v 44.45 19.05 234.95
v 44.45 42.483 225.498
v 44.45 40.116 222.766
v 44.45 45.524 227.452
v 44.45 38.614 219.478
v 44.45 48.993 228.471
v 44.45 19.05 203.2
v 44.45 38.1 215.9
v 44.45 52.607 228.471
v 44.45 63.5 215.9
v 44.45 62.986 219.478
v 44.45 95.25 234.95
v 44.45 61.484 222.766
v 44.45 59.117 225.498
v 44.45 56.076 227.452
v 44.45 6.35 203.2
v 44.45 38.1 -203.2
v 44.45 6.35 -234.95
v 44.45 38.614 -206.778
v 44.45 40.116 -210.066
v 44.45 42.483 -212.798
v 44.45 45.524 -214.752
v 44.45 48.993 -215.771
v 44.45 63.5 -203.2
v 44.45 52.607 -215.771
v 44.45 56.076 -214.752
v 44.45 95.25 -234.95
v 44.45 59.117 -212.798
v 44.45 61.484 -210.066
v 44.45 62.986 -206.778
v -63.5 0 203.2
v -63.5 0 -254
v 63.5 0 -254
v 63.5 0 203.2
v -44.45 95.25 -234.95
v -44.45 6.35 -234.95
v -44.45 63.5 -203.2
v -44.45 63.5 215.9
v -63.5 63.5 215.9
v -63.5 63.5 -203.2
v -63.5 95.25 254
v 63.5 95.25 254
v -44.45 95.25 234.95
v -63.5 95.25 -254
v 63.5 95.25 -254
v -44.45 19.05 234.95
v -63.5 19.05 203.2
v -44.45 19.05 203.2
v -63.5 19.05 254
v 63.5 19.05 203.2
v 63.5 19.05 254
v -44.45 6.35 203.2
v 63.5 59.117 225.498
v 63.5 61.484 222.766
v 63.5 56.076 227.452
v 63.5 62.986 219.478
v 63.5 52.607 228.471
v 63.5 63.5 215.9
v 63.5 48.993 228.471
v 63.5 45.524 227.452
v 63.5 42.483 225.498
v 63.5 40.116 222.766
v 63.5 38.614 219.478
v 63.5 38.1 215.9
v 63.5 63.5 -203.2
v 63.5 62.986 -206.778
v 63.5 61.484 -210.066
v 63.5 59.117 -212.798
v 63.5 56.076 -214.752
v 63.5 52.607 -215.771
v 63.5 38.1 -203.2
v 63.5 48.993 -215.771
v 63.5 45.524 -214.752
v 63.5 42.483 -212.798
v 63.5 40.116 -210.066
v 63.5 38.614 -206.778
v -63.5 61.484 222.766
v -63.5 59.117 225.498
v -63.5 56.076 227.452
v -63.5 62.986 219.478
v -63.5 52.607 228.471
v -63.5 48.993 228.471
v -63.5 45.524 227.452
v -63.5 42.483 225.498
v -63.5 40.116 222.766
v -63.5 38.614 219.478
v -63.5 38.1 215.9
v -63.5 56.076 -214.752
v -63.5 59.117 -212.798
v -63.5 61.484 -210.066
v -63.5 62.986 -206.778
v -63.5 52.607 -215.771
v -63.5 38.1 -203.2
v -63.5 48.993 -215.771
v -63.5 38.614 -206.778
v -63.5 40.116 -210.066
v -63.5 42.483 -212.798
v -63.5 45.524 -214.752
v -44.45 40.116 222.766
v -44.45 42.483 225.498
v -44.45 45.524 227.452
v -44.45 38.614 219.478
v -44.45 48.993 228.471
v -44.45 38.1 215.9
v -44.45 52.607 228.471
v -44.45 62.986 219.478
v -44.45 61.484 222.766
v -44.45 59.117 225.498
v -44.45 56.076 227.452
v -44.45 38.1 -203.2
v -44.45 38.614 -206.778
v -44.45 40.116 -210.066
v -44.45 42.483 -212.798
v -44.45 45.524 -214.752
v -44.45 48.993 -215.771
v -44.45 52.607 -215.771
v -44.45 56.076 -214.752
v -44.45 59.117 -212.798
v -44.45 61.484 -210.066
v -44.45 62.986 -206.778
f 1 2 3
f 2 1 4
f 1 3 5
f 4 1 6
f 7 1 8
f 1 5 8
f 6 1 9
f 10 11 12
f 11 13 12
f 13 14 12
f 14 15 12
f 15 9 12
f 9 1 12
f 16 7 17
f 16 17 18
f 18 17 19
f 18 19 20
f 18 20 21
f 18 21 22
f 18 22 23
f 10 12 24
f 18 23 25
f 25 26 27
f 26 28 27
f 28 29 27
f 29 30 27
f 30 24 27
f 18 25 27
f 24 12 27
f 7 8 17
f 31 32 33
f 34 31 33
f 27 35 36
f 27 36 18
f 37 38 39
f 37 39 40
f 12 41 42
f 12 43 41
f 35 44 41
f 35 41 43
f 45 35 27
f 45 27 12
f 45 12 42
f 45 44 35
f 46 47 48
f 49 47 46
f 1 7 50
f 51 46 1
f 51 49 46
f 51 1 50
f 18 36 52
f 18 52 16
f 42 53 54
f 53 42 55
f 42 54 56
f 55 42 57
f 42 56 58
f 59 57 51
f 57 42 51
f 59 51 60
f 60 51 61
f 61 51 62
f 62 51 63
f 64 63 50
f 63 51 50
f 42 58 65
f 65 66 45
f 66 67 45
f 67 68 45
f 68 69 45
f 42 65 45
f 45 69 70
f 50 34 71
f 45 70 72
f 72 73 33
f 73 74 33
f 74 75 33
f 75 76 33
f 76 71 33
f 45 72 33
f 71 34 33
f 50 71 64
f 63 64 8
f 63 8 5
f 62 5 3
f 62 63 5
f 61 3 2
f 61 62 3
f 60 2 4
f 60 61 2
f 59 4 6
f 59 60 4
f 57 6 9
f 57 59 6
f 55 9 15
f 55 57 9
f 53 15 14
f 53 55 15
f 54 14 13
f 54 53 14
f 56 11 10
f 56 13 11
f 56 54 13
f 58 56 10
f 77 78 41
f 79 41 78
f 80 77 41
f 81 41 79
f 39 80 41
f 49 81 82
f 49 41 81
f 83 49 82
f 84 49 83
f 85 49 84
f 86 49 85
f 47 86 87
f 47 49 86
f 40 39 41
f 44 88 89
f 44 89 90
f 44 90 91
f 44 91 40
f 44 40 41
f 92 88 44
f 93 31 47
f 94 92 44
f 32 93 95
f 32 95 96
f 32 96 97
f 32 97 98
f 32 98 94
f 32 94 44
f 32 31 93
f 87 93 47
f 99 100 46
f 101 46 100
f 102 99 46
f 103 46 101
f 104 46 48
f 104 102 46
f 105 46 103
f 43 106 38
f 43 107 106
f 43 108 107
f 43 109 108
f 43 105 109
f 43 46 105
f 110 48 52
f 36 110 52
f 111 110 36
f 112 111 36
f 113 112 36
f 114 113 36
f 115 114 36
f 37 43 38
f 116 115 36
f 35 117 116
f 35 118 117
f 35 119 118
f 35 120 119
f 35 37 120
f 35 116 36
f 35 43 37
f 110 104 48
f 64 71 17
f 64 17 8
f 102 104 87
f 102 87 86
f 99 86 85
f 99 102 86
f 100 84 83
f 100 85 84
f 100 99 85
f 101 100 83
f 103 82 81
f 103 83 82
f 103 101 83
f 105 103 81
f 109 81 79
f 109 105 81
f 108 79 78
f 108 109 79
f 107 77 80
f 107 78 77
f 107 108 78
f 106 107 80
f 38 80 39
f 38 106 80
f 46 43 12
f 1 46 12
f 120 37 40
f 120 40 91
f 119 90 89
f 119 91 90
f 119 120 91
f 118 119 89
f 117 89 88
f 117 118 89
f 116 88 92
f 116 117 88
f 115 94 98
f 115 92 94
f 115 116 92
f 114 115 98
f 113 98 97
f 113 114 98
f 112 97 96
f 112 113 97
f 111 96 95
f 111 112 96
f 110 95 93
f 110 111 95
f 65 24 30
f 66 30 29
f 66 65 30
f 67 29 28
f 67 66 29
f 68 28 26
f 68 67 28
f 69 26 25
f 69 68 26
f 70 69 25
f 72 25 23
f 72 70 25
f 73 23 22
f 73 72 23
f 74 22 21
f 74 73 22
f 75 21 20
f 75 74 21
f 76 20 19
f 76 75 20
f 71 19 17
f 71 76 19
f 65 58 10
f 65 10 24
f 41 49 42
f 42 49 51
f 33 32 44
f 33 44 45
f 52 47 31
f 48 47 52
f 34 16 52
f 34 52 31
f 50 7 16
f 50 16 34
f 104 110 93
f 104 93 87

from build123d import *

# Parameters (mm, degrees)
SKETCH1_W           = 127
SKETCH1_H           = 508
BOSS_EXTRUDE1_DEPTH = 95.25
SKETCH2_W           = 88.9
SKETCH2_H           = 469.9
CUT_EXTRUDE2_DEPTH  = 88.9
CUT_EXTRUDE3_DEPTH  = 128
SKETCH4_W           = 127
SKETCH4_H           = 19.05
CUT_EXTRUDE4_DEPTH  = 50.8


with BuildPart() as part:
    # Sketch1 → Boss-Extrude1 (new body)
    with BuildSketch(Plane(origin=(0, 0, 0), x_dir=(1, 0, 0), z_dir=(0, 1, 0))):
        Rectangle(SKETCH1_W, SKETCH1_H)
    extrude(amount=BOSS_EXTRUDE1_DEPTH)

    # Sketch2 → Cut-Extrude2 (cut)
    with BuildSketch(Plane(origin=(0, 95.25, 0), x_dir=(1, 0, 0), z_dir=(0, 1, 0))):
        Rectangle(SKETCH2_W, SKETCH2_H)
    extrude(amount=-CUT_EXTRUDE2_DEPTH, mode=Mode.SUBTRACT)

    # Sketch3 → Cut-Extrude3 (cut, through all)
    with BuildSketch(Plane(origin=(63.5, 0, 0), x_dir=(0, 0, -1), z_dir=(1, 0, 0))):
        with BuildLine():
            Line((203.2, 38.1), (-215.9, 38.1))
            ThreePointArc((-215.9, 38.1), (-228.6, 50.8), (-215.9, 63.5))
            Line((-215.9, 63.5), (203.2, 63.5))
            ThreePointArc((203.2, 63.5), (215.9, 50.8), (203.2, 38.1))
        make_face()
    extrude(amount=-CUT_EXTRUDE3_DEPTH, mode=Mode.SUBTRACT)

    # Sketch4 → Cut-Extrude4 (cut)
    with BuildSketch(Plane.XY.offset(254)):
        with Locations((0, 9.525)):
            Rectangle(SKETCH4_W, SKETCH4_H)
    extrude(amount=-CUT_EXTRUDE4_DEPTH, mode=Mode.SUBTRACT)


solid = part.part
